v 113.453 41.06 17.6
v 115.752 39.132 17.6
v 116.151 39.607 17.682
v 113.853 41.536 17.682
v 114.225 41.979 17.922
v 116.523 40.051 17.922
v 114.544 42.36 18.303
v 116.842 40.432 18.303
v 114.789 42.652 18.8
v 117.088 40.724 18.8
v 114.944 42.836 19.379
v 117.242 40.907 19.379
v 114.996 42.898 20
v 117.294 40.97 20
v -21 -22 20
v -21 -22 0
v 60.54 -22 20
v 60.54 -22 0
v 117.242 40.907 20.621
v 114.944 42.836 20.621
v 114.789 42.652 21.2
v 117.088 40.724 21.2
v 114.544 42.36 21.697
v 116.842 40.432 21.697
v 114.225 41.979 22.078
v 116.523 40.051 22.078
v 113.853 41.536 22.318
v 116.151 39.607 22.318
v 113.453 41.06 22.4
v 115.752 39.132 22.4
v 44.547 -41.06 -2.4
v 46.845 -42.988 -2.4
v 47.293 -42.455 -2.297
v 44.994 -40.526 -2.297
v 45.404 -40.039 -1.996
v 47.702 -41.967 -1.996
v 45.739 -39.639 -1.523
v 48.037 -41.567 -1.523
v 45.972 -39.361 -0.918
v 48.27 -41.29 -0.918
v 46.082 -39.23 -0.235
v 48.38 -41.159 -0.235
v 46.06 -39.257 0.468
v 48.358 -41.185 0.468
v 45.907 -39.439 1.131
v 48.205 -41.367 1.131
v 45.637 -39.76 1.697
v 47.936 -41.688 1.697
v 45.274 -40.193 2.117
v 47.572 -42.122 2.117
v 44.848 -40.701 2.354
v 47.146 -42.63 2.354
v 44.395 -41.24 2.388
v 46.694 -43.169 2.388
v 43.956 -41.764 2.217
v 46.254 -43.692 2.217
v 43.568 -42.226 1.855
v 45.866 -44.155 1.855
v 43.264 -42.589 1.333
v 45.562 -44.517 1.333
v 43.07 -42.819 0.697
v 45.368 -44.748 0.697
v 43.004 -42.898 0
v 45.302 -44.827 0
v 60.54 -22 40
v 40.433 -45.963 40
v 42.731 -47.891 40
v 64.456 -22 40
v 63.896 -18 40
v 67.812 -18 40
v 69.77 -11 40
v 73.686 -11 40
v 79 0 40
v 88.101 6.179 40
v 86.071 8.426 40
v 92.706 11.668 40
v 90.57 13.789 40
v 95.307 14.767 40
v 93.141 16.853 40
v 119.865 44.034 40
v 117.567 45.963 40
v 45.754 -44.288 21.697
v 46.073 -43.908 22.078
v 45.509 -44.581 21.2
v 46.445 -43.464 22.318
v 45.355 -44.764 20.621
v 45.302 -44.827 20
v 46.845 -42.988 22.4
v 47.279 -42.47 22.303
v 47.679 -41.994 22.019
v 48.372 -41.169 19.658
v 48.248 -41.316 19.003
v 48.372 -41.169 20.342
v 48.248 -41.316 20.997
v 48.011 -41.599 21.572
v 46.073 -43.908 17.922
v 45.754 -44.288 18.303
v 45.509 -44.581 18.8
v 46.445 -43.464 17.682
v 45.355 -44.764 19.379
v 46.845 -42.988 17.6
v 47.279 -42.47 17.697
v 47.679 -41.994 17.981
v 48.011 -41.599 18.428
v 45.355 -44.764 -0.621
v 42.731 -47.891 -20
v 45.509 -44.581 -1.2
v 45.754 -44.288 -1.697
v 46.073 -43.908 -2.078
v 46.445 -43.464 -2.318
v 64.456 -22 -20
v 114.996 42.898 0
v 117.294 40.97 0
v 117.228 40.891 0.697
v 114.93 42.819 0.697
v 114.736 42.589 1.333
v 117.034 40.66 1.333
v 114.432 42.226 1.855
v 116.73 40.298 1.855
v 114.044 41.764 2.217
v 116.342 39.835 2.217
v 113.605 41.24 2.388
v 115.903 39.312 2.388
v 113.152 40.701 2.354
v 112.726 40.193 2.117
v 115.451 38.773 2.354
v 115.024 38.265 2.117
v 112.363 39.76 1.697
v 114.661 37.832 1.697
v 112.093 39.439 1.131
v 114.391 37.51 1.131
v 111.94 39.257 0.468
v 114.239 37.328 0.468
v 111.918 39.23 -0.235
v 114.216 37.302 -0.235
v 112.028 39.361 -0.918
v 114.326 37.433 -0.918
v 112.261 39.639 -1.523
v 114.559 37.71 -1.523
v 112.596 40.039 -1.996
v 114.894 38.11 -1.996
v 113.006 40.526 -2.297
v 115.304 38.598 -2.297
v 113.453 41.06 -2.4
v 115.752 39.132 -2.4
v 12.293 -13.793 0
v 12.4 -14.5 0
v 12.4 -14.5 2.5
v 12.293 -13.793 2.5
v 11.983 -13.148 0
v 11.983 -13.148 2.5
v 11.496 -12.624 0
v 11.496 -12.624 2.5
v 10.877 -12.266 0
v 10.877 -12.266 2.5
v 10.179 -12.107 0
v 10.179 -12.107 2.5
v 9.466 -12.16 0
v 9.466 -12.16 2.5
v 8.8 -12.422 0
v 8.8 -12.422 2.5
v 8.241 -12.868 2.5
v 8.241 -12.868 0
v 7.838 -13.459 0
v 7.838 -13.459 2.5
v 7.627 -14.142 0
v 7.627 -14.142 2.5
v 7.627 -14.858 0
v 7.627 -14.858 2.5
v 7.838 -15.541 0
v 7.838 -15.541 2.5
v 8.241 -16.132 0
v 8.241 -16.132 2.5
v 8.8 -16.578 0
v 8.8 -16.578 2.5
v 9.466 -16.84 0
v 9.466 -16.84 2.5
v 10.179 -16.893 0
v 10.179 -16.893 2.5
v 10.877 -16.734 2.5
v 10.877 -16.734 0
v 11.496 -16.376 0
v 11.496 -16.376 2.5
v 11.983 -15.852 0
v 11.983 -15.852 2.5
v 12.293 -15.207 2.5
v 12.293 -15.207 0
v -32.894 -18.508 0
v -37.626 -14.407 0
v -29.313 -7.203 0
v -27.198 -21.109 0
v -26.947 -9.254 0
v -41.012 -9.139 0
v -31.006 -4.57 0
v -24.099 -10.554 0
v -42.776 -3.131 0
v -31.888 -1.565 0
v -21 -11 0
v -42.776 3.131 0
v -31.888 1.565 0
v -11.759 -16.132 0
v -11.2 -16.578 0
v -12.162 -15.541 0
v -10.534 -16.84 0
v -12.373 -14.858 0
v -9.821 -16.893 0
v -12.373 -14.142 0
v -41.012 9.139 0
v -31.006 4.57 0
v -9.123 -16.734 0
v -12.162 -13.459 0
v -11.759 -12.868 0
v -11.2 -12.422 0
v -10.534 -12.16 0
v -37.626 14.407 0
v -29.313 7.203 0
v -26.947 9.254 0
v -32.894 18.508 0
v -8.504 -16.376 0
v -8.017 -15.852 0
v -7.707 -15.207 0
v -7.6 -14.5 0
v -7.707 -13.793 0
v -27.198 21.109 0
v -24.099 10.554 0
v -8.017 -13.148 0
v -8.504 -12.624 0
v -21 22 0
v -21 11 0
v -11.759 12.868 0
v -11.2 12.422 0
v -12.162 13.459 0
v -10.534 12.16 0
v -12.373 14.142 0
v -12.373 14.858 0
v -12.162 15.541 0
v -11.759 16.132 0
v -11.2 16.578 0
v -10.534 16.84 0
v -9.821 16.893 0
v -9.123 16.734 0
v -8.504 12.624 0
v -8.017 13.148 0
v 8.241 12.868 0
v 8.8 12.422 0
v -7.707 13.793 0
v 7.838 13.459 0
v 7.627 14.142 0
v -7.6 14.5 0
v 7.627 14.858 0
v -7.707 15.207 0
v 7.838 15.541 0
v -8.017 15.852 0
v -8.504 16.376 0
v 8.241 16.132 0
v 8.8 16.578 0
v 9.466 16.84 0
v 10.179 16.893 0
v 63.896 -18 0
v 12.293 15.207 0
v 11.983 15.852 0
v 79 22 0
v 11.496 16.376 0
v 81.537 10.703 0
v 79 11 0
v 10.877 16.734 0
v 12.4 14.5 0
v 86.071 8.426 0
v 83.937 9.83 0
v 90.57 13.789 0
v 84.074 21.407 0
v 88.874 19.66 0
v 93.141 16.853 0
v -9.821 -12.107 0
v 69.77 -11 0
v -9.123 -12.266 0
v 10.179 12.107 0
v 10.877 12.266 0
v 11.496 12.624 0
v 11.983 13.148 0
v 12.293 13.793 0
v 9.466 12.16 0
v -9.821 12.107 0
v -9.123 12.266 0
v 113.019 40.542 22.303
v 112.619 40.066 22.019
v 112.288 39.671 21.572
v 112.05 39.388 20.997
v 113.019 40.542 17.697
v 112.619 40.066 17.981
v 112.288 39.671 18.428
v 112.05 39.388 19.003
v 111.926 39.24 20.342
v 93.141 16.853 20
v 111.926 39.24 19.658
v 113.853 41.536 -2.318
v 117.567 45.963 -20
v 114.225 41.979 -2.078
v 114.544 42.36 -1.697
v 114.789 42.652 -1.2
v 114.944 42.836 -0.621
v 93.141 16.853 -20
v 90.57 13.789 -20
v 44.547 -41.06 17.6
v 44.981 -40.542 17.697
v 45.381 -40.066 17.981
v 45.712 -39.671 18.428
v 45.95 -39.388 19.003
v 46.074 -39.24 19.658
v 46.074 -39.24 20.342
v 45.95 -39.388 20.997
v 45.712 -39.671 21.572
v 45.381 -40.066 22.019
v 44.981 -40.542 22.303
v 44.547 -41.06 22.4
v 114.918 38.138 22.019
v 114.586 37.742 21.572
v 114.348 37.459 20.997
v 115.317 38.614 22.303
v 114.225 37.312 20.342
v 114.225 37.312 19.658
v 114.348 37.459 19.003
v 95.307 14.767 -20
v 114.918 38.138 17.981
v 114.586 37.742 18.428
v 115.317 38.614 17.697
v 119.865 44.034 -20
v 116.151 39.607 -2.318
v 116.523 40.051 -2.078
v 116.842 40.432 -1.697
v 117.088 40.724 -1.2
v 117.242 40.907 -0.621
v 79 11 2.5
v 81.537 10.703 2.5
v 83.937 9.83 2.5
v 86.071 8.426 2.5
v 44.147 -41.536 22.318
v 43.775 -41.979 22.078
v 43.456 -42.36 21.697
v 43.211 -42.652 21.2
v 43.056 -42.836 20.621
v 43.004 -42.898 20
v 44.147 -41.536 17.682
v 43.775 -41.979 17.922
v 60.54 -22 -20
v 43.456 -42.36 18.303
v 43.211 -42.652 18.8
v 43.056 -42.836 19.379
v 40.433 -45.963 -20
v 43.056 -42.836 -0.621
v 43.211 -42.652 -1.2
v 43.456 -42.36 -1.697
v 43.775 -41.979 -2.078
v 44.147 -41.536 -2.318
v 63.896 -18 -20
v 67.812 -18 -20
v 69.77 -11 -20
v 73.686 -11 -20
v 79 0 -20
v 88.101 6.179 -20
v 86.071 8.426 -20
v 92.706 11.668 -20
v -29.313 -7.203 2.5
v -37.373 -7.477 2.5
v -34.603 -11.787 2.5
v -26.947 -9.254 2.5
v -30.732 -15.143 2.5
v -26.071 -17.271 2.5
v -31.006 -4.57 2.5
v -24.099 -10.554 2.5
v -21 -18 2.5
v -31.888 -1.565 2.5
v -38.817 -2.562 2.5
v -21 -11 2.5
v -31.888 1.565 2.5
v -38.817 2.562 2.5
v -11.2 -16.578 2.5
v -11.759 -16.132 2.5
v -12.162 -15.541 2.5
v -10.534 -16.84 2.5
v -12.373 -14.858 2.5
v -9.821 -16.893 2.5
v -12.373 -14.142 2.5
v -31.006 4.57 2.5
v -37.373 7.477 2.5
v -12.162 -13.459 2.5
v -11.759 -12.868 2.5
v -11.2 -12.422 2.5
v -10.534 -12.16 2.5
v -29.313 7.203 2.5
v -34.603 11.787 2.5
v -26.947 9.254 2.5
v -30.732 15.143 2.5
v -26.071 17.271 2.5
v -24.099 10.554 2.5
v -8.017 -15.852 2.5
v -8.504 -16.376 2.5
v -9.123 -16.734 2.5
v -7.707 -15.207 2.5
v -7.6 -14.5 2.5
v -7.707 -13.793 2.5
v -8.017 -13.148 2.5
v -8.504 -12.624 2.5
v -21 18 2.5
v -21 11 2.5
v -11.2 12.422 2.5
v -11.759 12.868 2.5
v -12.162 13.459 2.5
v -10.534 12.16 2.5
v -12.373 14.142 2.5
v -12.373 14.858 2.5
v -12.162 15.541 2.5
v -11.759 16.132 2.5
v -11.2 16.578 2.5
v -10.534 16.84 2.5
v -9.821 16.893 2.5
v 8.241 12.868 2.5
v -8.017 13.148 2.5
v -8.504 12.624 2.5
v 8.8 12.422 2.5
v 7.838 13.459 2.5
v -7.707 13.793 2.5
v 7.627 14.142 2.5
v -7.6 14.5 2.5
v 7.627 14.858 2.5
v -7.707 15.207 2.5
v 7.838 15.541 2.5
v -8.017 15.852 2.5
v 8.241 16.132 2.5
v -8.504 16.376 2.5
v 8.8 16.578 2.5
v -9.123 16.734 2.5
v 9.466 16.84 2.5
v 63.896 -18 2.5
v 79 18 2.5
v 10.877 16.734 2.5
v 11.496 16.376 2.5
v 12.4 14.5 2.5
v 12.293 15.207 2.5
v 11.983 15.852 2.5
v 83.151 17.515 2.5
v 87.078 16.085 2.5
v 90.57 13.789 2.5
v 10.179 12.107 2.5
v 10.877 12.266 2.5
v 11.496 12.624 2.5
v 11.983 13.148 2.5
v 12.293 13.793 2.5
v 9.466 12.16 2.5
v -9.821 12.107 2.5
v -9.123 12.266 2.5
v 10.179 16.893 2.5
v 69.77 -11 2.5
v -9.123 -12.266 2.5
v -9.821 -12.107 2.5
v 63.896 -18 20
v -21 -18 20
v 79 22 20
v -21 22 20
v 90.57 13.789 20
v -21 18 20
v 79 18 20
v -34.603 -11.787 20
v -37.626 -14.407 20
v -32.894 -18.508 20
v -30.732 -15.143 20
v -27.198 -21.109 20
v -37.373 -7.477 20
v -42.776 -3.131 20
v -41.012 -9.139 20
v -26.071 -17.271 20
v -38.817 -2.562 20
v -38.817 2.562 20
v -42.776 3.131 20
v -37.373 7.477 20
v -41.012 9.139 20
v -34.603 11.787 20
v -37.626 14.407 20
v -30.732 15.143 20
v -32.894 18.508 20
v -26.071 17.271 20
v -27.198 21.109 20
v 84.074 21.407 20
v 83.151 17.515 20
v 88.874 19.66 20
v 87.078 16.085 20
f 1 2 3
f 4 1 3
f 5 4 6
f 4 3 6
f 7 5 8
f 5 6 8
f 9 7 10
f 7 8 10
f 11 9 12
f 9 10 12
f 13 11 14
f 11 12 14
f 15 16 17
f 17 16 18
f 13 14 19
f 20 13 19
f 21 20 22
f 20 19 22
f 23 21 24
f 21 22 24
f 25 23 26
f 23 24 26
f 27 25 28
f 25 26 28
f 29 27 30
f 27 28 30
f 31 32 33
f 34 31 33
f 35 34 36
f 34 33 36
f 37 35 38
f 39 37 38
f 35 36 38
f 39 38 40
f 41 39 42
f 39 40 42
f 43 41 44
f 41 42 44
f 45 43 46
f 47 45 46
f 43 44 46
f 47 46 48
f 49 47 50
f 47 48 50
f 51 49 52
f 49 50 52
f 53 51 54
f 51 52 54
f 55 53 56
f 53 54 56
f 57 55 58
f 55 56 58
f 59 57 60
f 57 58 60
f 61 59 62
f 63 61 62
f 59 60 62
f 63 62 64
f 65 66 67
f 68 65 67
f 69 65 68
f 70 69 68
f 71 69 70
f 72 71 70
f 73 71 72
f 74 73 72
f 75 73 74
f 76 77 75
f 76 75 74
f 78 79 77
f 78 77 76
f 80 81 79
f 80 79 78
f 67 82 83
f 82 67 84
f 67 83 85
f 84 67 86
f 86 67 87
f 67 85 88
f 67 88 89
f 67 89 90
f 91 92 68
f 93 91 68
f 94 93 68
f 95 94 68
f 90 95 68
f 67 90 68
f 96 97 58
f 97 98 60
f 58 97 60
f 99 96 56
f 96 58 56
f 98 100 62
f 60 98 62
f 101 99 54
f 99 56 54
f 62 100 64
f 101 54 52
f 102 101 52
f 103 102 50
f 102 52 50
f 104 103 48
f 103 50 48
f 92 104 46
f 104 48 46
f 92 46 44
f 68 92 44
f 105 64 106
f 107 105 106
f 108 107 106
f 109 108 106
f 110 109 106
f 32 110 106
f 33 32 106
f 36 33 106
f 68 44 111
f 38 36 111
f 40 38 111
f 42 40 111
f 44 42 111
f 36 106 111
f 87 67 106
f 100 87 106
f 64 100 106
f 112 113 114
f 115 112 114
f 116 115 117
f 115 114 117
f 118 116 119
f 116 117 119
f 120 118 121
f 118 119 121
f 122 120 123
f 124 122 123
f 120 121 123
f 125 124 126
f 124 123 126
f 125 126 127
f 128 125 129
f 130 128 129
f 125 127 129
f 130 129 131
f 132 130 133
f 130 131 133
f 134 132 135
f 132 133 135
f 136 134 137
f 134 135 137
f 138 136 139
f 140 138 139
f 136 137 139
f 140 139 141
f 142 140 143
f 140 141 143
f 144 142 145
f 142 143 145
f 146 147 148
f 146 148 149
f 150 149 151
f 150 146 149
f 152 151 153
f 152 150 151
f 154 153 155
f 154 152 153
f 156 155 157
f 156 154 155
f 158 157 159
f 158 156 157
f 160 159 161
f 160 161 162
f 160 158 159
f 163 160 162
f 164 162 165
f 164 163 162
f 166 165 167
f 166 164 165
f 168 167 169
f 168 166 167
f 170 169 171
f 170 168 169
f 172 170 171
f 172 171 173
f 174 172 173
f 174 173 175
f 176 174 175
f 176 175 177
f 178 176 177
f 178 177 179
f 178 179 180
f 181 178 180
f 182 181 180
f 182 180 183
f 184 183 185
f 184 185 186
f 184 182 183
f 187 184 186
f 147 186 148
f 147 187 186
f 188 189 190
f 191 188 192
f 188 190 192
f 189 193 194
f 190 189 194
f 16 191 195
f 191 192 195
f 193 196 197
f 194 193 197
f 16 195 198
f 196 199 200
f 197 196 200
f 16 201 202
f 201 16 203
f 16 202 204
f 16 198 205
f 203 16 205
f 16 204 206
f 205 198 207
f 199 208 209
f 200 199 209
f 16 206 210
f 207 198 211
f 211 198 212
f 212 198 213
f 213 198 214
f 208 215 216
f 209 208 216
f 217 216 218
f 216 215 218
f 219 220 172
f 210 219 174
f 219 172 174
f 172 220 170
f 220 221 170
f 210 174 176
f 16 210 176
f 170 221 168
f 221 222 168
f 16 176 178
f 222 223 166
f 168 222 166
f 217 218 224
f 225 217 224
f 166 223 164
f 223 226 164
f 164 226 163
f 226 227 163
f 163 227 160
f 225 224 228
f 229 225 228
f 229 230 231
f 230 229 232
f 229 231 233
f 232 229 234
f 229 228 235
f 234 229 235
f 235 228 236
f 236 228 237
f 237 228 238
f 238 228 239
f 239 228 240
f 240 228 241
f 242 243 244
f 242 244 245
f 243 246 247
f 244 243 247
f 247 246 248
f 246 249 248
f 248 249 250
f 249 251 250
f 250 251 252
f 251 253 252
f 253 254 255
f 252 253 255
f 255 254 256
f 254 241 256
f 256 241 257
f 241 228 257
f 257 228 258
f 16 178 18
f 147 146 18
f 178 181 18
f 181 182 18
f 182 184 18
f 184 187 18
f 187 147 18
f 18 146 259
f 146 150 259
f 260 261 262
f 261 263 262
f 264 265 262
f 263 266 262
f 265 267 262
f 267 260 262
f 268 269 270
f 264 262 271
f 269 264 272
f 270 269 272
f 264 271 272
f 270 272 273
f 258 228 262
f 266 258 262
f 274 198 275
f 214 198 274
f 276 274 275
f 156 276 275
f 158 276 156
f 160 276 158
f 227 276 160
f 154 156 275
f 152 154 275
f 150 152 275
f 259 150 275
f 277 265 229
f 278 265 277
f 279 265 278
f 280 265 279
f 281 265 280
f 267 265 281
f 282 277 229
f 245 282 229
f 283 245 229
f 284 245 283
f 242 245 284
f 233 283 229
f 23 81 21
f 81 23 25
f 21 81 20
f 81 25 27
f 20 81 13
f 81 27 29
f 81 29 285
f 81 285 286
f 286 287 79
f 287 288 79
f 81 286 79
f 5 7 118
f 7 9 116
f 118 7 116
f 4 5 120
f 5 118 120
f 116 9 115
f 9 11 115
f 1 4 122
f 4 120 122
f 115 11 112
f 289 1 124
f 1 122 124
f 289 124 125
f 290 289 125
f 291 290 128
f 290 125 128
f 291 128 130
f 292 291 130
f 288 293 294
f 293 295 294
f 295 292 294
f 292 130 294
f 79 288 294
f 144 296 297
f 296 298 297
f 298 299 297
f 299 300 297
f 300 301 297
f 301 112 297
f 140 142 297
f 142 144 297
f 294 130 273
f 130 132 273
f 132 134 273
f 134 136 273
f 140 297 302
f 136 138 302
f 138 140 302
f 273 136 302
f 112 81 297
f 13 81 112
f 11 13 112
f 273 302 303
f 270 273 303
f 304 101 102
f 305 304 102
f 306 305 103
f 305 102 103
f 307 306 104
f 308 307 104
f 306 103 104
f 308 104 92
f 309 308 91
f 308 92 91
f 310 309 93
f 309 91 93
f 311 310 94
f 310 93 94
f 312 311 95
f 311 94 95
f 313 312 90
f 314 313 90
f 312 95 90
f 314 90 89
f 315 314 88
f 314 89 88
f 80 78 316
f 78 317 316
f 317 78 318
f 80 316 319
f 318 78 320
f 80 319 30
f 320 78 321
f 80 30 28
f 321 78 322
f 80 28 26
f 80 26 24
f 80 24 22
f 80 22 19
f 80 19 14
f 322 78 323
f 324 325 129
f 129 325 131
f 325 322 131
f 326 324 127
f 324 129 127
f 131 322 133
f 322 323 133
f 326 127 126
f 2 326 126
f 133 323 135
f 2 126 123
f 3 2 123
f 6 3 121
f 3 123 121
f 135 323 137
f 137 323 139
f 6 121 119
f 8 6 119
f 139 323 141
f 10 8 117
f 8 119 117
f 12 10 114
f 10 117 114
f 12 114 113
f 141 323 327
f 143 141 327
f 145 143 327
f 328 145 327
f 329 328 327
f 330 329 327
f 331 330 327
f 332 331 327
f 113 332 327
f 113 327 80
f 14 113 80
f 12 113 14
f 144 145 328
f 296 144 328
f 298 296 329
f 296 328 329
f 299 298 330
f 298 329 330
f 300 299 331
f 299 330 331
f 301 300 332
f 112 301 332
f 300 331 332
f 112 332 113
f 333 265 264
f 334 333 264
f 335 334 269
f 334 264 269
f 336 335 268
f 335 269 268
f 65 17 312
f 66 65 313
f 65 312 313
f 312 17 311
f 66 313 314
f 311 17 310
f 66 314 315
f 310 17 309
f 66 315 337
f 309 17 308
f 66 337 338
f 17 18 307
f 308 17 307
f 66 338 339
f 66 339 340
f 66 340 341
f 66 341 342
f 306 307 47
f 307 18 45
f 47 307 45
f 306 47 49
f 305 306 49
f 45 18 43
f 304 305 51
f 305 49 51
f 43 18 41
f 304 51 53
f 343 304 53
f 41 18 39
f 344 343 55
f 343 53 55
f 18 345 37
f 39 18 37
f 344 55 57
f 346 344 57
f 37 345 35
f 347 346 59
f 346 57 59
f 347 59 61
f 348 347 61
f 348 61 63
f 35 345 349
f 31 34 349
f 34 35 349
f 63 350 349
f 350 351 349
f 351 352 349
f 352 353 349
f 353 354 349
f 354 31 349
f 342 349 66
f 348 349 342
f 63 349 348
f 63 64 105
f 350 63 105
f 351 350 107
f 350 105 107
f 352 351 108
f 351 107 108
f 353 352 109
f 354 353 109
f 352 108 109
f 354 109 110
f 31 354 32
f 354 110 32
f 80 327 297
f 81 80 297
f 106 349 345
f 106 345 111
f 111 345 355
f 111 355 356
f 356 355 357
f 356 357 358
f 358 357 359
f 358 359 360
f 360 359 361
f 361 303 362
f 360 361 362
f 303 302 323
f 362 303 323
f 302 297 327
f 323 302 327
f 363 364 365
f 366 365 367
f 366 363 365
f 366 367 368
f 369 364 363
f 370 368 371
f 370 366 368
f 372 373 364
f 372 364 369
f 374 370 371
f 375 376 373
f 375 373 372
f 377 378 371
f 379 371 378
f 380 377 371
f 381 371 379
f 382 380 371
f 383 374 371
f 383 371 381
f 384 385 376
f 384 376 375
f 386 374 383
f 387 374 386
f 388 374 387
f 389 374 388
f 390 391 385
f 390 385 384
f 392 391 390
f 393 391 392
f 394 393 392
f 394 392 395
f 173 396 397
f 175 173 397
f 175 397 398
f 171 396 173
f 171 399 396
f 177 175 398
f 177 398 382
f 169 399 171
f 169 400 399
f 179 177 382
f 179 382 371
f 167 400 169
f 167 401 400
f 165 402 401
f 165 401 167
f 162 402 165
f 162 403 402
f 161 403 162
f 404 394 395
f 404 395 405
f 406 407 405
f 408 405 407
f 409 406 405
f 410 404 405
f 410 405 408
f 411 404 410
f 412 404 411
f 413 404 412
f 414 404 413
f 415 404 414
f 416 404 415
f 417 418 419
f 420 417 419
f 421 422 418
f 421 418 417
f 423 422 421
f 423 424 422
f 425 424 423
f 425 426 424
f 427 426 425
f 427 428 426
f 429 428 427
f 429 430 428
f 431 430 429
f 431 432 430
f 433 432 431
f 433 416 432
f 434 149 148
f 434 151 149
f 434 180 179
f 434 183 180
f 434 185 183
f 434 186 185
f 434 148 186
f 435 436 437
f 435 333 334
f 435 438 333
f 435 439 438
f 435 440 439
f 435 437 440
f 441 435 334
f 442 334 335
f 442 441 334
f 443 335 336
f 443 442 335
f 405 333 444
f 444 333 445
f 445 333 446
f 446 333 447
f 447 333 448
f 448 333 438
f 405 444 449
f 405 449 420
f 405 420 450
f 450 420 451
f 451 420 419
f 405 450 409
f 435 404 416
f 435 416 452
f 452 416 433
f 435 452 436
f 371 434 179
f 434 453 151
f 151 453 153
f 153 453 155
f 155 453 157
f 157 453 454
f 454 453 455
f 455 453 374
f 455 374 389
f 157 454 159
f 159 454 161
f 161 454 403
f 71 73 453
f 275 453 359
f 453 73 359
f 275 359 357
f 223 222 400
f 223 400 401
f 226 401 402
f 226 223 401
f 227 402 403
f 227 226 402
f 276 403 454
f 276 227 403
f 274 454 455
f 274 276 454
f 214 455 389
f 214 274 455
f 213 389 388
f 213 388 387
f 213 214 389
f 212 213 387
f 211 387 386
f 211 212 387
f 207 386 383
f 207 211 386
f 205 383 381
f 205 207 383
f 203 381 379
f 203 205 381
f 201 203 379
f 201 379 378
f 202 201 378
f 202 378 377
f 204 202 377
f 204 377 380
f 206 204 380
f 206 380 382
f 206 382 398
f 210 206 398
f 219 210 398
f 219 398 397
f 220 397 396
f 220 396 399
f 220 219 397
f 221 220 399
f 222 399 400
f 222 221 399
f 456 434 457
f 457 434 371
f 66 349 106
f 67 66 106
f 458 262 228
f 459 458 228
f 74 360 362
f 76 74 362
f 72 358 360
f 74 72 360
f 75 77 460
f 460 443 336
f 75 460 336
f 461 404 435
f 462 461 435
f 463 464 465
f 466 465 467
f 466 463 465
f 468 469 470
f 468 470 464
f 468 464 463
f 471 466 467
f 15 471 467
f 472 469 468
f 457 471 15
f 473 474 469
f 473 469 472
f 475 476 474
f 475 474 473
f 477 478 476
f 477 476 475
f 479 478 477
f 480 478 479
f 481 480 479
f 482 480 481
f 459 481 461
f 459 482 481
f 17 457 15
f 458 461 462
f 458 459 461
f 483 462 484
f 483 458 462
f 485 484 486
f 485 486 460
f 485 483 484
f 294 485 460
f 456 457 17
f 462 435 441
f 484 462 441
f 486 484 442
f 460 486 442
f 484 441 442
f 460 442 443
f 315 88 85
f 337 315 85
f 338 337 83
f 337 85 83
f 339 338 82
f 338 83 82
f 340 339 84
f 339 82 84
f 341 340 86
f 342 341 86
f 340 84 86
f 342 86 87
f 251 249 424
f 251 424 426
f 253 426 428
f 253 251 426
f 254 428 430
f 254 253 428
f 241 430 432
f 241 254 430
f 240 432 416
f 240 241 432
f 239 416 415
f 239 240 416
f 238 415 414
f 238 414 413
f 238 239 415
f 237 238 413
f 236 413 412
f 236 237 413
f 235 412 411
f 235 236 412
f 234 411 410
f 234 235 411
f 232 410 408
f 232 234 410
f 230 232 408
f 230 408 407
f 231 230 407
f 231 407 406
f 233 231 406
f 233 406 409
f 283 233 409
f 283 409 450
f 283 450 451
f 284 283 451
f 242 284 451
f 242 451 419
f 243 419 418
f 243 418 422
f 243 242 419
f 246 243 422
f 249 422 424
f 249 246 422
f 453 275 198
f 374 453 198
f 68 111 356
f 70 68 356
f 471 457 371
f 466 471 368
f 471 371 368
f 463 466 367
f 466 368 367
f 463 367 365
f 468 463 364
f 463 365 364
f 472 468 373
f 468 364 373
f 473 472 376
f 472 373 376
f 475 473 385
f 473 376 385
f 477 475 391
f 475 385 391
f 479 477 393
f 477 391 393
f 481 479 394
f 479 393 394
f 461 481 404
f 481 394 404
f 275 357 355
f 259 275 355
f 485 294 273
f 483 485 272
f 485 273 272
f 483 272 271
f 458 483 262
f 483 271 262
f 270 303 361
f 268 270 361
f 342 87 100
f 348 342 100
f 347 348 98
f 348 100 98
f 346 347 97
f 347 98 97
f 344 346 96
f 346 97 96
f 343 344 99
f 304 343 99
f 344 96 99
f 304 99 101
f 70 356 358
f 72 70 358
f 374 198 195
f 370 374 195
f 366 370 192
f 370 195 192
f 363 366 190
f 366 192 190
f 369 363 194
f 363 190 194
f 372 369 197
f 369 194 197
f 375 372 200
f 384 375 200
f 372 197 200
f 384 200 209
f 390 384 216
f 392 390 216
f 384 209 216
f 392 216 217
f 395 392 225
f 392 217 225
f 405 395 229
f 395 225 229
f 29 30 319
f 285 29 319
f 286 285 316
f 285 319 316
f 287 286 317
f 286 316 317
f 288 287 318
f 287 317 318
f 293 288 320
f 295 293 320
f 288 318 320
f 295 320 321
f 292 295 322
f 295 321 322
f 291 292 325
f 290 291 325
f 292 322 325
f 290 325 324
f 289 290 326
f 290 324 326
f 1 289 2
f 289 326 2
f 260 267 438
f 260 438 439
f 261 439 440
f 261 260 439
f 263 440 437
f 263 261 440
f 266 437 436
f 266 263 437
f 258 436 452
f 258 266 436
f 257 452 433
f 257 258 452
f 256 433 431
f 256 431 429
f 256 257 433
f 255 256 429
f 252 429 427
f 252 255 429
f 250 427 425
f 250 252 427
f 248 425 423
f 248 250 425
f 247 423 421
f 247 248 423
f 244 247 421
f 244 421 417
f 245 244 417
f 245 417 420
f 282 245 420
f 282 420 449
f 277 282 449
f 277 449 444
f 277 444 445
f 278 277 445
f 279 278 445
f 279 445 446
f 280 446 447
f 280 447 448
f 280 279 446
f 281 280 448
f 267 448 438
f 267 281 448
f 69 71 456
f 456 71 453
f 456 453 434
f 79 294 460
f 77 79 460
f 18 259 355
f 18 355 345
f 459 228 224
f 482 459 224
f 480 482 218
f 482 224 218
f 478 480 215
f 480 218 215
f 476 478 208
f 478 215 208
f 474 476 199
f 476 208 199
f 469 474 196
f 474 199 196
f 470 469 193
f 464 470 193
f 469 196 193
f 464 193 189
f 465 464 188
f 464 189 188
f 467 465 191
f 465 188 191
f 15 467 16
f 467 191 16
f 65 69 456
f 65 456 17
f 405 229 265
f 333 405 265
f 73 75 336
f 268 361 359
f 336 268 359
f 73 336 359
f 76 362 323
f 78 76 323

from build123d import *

# Parameters (mm, degrees)
SKETCH1_R           = 2.4
BOSS_EXTRUDE1_DEPTH = 2.5
BOSS_EXTRUDE2_DEPTH = 20
BOSS_EXTRUDE3_DEPTH = 40
BOSS_EXTRUDE4_START = -20
BOSS_EXTRUDE4_DEPTH = 20
CUT_EXTRUDE1_DEPTH  = 3


with BuildPart() as part:
    # Sketch1 → Boss-Extrude1 (new body)
    with BuildSketch(Plane.XY):
        with BuildLine():
            ThreePointArc((-21, -11), (-32, 0), (-21, 11))
            Line((-21, 11), (79, 11))
            ThreePointArc((79, 11), (82.762221577, 10.336618829), (86.070663707, 8.426488874))
            Line((86.070663707, 8.426488874), (90.570176974, 13.788799976))
            ThreePointArc((90.570176974, 13.788799976), (85.15636258, 16.914467174), (79, 18))
            Line((79, 18), (-21, 18))
            ThreePointArc((-21, 18), (-39, 0), (-21, -18))
            Line((-21, -18), (63.896206639, -18))
            Line((63.896206639, -18), (69.769904057, -11))
            Line((69.769904057, -11), (-21, -11))
        make_face()
        with Locations((10, -14.5)):
            Circle(SKETCH1_R, mode=Mode.SUBTRACT)
        with Locations((-10, -14.5)):
            Circle(SKETCH1_R, mode=Mode.SUBTRACT)
        with Locations((10, 14.5)):
            Circle(SKETCH1_R, mode=Mode.SUBTRACT)
        with Locations((-10, 14.5)):
            Circle(SKETCH1_R, mode=Mode.SUBTRACT)
    extrude(amount=BOSS_EXTRUDE1_DEPTH)

    # Sketch1<3> → Boss-Extrude2 (add)
    with BuildSketch(Plane.XY):
        with BuildLine():
            ThreePointArc((79, 18), (85.15636258, 16.914467174), (90.570176974, 13.788799976))
            Line((90.570176974, 13.788799976), (93.141327413, 16.852977749))
            ThreePointArc((93.141327413, 16.852977749), (86.524443153, 20.673237657), (79, 22))
            Line((79, 22), (-21, 22))
            ThreePointArc((-21, 22), (-43, 0), (-21, -22))
            Line((-21, -22), (60.539808114, -22))
            Line((60.539808114, -22), (63.896206639, -18))
            Line((63.896206639, -18), (-21, -18))
            ThreePointArc((-21, -18), (-39, 0), (-21, 18))
            Line((-21, 18), (79, 18))
        make_face()
    extrude(amount=BOSS_EXTRUDE2_DEPTH)

    # Sketch1<4> → Boss-Extrude3 (add)
    with BuildSketch(Plane.XY):
        with BuildLine():
            Line((86.070663707, 8.426488874), (79, 0))
            Line((79, 0), (69.769904057, -11))
            Line((69.769904057, -11), (73.686125925, -11))
            Line((73.686125925, -11), (88.100757974, 6.17868953))
            ThreePointArc((88.100757974, 6.17868953), (87.163447205, 7.372796602), (86.070663707, 8.426488874))
        make_face()
        with BuildLine():
            Line((90.570176974, 13.788799976), (86.070663707, 8.426488874))
            ThreePointArc((86.070663707, 8.426488874), (87.163447205, 7.372796602), (88.100757974, 6.17868953))
            Line((88.100757974, 6.17868953), (92.706481677, 11.6675773))
            ThreePointArc((92.706481677, 11.6675773), (91.682754612, 12.772929791), (90.570176974, 13.788799976))
        make_face()
        with BuildLine():
            Line((93.141327413, 16.852977749), (90.570176974, 13.788799976))
            ThreePointArc((90.570176974, 13.788799976), (91.682754612, 12.772929791), (92.706481677, 11.6675773))
            Line((92.706481677, 11.6675773), (95.307364493, 14.76718874))
            ThreePointArc((95.307364493, 14.76718874), (94.260024202, 15.847134168), (93.141327413, 16.852977749))
        make_face()
        with BuildLine():
            Line((117.567256581, 45.962666587), (93.141327413, 16.852977749))
            ThreePointArc((93.141327413, 16.852977749), (94.260024202, 15.847134168), (95.307364493, 14.76718874))
            Line((95.307364493, 14.76718874), (119.865389911, 44.034303758))
            Line((119.865389911, 44.034303758), (117.567256581, 45.962666587))
        make_face()
        Polygon((64.456029982, -22), (60.539808114, -22), (40.432743419, -45.962666587), (42.730876748, -47.891029416), align=None)
        Polygon((67.812428507, -18), (63.896206639, -18), (60.539808114, -22), (64.456029982, -22), align=None)
        Polygon((73.686125925, -11), (69.769904057, -11), (63.896206639, -18), (67.812428507, -18), align=None)
    extrude(amount=BOSS_EXTRUDE3_DEPTH)

    # Sketch1<5> → Boss-Extrude4 (add)
    with BuildSketch(Plane.XY.offset(BOSS_EXTRUDE4_START)):
        Polygon((64.456029982, -22), (60.539808114, -22), (40.432743419, -45.962666587), (42.730876748, -47.891029416), align=None)
        with BuildLine():
            Line((117.567256581, 45.962666587), (93.141327413, 16.852977749))
            ThreePointArc((93.141327413, 16.852977749), (94.260024202, 15.847134168), (95.307364493, 14.76718874))
            Line((95.307364493, 14.76718874), (119.865389911, 44.034303758))
            Line((119.865389911, 44.034303758), (117.567256581, 45.962666587))
        make_face()
        with BuildLine():
            Line((90.570176974, 13.788799976), (86.070663707, 8.426488874))
            ThreePointArc((86.070663707, 8.426488874), (87.163447205, 7.372796602), (88.100757974, 6.17868953))
            Line((88.100757974, 6.17868953), (92.706481677, 11.6675773))
            ThreePointArc((92.706481677, 11.6675773), (91.682754612, 12.772929791), (90.570176974, 13.788799976))
        make_face()
        with BuildLine():
            Line((93.141327413, 16.852977749), (90.570176974, 13.788799976))
            ThreePointArc((90.570176974, 13.788799976), (91.682754612, 12.772929791), (92.706481677, 11.6675773))
            Line((92.706481677, 11.6675773), (95.307364493, 14.76718874))
            ThreePointArc((95.307364493, 14.76718874), (94.260024202, 15.847134168), (93.141327413, 16.852977749))
        make_face()
        with BuildLine():
            Line((86.070663707, 8.426488874), (79, 0))
            Line((79, 0), (69.769904057, -11))
            Line((69.769904057, -11), (73.686125925, -11))
            Line((73.686125925, -11), (88.100757974, 6.17868953))
            ThreePointArc((88.100757974, 6.17868953), (87.163447205, 7.372796602), (86.070663707, 8.426488874))
        make_face()
        Polygon((73.686125925, -11), (69.769904057, -11), (63.896206639, -18), (67.812428507, -18), align=None)
        Polygon((67.812428507, -18), (63.896206639, -18), (60.539808114, -22), (64.456029982, -22), align=None)
    extrude(amount=BOSS_EXTRUDE4_DEPTH)

    # Sketch5 → Cut-Extrude1 (cut)
    with BuildSketch(Plane(origin=(48.657236347, -40.828269073, 0), x_dir=(0, 0, -1), z_dir=(0.7660444431189747, -0.6427876096865435, 0))):
        with BuildLine():
            ThreePointArc((-17.6, -2.819778835), (-20, -0.419778835), (-22.4, -2.819778835))
            Line((-22.4, -2.819778835), (-20, -2.819778835))
            Line((-20, -2.819778835), (-20, -5.219778835))
            ThreePointArc((-20, -5.219778835), (-18.302943725, -4.51683511), (-17.6, -2.819778835))
        make_face()
        with BuildLine():
            Line((-20, -2.819778835), (-22.4, -2.819778835))
            ThreePointArc((-22.4, -2.819778835), (-21.697056275, -4.51683511), (-20, -5.219778835))
            Line((-20, -5.219778835), (-20, -2.819778835))
        make_face()
        with BuildLine():
            Line((0, -5.219778835), (0, -2.819778835))
            Line((0, -2.819778835), (2.4, -2.819778835))
            ThreePointArc((2.4, -2.819778835), (-1.697056275, -1.12272256), (0, -5.219778835))
        make_face()
        with BuildLine():
            Line((2.4, -2.819778835), (0, -2.819778835))
            Line((0, -2.819778835), (0, -5.219778835))
            ThreePointArc((0, -5.219778835), (1.697056275, -4.51683511), (2.4, -2.819778835))
        make_face()
        with BuildLine():
            ThreePointArc((-17.6, 104.380221165), (-18.302943725, 106.07727744), (-20, 106.780221165))
            Line((-20, 106.780221165), (-20, 104.380221165))
            Line((-20, 104.380221165), (-22.4, 104.380221165))
            ThreePointArc((-22.4, 104.380221165), (-20, 101.980221165), (-17.6, 104.380221165))
        make_face()
        with BuildLine():
            Line((-20, 104.380221165), (-20, 106.780221165))
            ThreePointArc((-20, 106.780221165), (-21.697056275, 106.07727744), (-22.4, 104.380221165))
            Line((-22.4, 104.380221165), (-20, 104.380221165))
        make_face()
        with BuildLine():
            ThreePointArc((2.4, 104.380221165), (1.697056275, 106.07727744), (0, 106.780221165))
            Line((0, 106.780221165), (0, 104.380221165))
            Line((0, 104.380221165), (2.4, 104.380221165))
        make_face()
        with BuildLine():
            Line((0, 104.380221165), (0, 106.780221165))
            ThreePointArc((0, 106.780221165), (-1.697056275, 102.68316489), (2.4, 104.380221165))
            Line((2.4, 104.380221165), (0, 104.380221165))
        make_face()
    extrude(amount=-CUT_EXTRUDE1_DEPTH, mode=Mode.SUBTRACT)


solid = part.part
